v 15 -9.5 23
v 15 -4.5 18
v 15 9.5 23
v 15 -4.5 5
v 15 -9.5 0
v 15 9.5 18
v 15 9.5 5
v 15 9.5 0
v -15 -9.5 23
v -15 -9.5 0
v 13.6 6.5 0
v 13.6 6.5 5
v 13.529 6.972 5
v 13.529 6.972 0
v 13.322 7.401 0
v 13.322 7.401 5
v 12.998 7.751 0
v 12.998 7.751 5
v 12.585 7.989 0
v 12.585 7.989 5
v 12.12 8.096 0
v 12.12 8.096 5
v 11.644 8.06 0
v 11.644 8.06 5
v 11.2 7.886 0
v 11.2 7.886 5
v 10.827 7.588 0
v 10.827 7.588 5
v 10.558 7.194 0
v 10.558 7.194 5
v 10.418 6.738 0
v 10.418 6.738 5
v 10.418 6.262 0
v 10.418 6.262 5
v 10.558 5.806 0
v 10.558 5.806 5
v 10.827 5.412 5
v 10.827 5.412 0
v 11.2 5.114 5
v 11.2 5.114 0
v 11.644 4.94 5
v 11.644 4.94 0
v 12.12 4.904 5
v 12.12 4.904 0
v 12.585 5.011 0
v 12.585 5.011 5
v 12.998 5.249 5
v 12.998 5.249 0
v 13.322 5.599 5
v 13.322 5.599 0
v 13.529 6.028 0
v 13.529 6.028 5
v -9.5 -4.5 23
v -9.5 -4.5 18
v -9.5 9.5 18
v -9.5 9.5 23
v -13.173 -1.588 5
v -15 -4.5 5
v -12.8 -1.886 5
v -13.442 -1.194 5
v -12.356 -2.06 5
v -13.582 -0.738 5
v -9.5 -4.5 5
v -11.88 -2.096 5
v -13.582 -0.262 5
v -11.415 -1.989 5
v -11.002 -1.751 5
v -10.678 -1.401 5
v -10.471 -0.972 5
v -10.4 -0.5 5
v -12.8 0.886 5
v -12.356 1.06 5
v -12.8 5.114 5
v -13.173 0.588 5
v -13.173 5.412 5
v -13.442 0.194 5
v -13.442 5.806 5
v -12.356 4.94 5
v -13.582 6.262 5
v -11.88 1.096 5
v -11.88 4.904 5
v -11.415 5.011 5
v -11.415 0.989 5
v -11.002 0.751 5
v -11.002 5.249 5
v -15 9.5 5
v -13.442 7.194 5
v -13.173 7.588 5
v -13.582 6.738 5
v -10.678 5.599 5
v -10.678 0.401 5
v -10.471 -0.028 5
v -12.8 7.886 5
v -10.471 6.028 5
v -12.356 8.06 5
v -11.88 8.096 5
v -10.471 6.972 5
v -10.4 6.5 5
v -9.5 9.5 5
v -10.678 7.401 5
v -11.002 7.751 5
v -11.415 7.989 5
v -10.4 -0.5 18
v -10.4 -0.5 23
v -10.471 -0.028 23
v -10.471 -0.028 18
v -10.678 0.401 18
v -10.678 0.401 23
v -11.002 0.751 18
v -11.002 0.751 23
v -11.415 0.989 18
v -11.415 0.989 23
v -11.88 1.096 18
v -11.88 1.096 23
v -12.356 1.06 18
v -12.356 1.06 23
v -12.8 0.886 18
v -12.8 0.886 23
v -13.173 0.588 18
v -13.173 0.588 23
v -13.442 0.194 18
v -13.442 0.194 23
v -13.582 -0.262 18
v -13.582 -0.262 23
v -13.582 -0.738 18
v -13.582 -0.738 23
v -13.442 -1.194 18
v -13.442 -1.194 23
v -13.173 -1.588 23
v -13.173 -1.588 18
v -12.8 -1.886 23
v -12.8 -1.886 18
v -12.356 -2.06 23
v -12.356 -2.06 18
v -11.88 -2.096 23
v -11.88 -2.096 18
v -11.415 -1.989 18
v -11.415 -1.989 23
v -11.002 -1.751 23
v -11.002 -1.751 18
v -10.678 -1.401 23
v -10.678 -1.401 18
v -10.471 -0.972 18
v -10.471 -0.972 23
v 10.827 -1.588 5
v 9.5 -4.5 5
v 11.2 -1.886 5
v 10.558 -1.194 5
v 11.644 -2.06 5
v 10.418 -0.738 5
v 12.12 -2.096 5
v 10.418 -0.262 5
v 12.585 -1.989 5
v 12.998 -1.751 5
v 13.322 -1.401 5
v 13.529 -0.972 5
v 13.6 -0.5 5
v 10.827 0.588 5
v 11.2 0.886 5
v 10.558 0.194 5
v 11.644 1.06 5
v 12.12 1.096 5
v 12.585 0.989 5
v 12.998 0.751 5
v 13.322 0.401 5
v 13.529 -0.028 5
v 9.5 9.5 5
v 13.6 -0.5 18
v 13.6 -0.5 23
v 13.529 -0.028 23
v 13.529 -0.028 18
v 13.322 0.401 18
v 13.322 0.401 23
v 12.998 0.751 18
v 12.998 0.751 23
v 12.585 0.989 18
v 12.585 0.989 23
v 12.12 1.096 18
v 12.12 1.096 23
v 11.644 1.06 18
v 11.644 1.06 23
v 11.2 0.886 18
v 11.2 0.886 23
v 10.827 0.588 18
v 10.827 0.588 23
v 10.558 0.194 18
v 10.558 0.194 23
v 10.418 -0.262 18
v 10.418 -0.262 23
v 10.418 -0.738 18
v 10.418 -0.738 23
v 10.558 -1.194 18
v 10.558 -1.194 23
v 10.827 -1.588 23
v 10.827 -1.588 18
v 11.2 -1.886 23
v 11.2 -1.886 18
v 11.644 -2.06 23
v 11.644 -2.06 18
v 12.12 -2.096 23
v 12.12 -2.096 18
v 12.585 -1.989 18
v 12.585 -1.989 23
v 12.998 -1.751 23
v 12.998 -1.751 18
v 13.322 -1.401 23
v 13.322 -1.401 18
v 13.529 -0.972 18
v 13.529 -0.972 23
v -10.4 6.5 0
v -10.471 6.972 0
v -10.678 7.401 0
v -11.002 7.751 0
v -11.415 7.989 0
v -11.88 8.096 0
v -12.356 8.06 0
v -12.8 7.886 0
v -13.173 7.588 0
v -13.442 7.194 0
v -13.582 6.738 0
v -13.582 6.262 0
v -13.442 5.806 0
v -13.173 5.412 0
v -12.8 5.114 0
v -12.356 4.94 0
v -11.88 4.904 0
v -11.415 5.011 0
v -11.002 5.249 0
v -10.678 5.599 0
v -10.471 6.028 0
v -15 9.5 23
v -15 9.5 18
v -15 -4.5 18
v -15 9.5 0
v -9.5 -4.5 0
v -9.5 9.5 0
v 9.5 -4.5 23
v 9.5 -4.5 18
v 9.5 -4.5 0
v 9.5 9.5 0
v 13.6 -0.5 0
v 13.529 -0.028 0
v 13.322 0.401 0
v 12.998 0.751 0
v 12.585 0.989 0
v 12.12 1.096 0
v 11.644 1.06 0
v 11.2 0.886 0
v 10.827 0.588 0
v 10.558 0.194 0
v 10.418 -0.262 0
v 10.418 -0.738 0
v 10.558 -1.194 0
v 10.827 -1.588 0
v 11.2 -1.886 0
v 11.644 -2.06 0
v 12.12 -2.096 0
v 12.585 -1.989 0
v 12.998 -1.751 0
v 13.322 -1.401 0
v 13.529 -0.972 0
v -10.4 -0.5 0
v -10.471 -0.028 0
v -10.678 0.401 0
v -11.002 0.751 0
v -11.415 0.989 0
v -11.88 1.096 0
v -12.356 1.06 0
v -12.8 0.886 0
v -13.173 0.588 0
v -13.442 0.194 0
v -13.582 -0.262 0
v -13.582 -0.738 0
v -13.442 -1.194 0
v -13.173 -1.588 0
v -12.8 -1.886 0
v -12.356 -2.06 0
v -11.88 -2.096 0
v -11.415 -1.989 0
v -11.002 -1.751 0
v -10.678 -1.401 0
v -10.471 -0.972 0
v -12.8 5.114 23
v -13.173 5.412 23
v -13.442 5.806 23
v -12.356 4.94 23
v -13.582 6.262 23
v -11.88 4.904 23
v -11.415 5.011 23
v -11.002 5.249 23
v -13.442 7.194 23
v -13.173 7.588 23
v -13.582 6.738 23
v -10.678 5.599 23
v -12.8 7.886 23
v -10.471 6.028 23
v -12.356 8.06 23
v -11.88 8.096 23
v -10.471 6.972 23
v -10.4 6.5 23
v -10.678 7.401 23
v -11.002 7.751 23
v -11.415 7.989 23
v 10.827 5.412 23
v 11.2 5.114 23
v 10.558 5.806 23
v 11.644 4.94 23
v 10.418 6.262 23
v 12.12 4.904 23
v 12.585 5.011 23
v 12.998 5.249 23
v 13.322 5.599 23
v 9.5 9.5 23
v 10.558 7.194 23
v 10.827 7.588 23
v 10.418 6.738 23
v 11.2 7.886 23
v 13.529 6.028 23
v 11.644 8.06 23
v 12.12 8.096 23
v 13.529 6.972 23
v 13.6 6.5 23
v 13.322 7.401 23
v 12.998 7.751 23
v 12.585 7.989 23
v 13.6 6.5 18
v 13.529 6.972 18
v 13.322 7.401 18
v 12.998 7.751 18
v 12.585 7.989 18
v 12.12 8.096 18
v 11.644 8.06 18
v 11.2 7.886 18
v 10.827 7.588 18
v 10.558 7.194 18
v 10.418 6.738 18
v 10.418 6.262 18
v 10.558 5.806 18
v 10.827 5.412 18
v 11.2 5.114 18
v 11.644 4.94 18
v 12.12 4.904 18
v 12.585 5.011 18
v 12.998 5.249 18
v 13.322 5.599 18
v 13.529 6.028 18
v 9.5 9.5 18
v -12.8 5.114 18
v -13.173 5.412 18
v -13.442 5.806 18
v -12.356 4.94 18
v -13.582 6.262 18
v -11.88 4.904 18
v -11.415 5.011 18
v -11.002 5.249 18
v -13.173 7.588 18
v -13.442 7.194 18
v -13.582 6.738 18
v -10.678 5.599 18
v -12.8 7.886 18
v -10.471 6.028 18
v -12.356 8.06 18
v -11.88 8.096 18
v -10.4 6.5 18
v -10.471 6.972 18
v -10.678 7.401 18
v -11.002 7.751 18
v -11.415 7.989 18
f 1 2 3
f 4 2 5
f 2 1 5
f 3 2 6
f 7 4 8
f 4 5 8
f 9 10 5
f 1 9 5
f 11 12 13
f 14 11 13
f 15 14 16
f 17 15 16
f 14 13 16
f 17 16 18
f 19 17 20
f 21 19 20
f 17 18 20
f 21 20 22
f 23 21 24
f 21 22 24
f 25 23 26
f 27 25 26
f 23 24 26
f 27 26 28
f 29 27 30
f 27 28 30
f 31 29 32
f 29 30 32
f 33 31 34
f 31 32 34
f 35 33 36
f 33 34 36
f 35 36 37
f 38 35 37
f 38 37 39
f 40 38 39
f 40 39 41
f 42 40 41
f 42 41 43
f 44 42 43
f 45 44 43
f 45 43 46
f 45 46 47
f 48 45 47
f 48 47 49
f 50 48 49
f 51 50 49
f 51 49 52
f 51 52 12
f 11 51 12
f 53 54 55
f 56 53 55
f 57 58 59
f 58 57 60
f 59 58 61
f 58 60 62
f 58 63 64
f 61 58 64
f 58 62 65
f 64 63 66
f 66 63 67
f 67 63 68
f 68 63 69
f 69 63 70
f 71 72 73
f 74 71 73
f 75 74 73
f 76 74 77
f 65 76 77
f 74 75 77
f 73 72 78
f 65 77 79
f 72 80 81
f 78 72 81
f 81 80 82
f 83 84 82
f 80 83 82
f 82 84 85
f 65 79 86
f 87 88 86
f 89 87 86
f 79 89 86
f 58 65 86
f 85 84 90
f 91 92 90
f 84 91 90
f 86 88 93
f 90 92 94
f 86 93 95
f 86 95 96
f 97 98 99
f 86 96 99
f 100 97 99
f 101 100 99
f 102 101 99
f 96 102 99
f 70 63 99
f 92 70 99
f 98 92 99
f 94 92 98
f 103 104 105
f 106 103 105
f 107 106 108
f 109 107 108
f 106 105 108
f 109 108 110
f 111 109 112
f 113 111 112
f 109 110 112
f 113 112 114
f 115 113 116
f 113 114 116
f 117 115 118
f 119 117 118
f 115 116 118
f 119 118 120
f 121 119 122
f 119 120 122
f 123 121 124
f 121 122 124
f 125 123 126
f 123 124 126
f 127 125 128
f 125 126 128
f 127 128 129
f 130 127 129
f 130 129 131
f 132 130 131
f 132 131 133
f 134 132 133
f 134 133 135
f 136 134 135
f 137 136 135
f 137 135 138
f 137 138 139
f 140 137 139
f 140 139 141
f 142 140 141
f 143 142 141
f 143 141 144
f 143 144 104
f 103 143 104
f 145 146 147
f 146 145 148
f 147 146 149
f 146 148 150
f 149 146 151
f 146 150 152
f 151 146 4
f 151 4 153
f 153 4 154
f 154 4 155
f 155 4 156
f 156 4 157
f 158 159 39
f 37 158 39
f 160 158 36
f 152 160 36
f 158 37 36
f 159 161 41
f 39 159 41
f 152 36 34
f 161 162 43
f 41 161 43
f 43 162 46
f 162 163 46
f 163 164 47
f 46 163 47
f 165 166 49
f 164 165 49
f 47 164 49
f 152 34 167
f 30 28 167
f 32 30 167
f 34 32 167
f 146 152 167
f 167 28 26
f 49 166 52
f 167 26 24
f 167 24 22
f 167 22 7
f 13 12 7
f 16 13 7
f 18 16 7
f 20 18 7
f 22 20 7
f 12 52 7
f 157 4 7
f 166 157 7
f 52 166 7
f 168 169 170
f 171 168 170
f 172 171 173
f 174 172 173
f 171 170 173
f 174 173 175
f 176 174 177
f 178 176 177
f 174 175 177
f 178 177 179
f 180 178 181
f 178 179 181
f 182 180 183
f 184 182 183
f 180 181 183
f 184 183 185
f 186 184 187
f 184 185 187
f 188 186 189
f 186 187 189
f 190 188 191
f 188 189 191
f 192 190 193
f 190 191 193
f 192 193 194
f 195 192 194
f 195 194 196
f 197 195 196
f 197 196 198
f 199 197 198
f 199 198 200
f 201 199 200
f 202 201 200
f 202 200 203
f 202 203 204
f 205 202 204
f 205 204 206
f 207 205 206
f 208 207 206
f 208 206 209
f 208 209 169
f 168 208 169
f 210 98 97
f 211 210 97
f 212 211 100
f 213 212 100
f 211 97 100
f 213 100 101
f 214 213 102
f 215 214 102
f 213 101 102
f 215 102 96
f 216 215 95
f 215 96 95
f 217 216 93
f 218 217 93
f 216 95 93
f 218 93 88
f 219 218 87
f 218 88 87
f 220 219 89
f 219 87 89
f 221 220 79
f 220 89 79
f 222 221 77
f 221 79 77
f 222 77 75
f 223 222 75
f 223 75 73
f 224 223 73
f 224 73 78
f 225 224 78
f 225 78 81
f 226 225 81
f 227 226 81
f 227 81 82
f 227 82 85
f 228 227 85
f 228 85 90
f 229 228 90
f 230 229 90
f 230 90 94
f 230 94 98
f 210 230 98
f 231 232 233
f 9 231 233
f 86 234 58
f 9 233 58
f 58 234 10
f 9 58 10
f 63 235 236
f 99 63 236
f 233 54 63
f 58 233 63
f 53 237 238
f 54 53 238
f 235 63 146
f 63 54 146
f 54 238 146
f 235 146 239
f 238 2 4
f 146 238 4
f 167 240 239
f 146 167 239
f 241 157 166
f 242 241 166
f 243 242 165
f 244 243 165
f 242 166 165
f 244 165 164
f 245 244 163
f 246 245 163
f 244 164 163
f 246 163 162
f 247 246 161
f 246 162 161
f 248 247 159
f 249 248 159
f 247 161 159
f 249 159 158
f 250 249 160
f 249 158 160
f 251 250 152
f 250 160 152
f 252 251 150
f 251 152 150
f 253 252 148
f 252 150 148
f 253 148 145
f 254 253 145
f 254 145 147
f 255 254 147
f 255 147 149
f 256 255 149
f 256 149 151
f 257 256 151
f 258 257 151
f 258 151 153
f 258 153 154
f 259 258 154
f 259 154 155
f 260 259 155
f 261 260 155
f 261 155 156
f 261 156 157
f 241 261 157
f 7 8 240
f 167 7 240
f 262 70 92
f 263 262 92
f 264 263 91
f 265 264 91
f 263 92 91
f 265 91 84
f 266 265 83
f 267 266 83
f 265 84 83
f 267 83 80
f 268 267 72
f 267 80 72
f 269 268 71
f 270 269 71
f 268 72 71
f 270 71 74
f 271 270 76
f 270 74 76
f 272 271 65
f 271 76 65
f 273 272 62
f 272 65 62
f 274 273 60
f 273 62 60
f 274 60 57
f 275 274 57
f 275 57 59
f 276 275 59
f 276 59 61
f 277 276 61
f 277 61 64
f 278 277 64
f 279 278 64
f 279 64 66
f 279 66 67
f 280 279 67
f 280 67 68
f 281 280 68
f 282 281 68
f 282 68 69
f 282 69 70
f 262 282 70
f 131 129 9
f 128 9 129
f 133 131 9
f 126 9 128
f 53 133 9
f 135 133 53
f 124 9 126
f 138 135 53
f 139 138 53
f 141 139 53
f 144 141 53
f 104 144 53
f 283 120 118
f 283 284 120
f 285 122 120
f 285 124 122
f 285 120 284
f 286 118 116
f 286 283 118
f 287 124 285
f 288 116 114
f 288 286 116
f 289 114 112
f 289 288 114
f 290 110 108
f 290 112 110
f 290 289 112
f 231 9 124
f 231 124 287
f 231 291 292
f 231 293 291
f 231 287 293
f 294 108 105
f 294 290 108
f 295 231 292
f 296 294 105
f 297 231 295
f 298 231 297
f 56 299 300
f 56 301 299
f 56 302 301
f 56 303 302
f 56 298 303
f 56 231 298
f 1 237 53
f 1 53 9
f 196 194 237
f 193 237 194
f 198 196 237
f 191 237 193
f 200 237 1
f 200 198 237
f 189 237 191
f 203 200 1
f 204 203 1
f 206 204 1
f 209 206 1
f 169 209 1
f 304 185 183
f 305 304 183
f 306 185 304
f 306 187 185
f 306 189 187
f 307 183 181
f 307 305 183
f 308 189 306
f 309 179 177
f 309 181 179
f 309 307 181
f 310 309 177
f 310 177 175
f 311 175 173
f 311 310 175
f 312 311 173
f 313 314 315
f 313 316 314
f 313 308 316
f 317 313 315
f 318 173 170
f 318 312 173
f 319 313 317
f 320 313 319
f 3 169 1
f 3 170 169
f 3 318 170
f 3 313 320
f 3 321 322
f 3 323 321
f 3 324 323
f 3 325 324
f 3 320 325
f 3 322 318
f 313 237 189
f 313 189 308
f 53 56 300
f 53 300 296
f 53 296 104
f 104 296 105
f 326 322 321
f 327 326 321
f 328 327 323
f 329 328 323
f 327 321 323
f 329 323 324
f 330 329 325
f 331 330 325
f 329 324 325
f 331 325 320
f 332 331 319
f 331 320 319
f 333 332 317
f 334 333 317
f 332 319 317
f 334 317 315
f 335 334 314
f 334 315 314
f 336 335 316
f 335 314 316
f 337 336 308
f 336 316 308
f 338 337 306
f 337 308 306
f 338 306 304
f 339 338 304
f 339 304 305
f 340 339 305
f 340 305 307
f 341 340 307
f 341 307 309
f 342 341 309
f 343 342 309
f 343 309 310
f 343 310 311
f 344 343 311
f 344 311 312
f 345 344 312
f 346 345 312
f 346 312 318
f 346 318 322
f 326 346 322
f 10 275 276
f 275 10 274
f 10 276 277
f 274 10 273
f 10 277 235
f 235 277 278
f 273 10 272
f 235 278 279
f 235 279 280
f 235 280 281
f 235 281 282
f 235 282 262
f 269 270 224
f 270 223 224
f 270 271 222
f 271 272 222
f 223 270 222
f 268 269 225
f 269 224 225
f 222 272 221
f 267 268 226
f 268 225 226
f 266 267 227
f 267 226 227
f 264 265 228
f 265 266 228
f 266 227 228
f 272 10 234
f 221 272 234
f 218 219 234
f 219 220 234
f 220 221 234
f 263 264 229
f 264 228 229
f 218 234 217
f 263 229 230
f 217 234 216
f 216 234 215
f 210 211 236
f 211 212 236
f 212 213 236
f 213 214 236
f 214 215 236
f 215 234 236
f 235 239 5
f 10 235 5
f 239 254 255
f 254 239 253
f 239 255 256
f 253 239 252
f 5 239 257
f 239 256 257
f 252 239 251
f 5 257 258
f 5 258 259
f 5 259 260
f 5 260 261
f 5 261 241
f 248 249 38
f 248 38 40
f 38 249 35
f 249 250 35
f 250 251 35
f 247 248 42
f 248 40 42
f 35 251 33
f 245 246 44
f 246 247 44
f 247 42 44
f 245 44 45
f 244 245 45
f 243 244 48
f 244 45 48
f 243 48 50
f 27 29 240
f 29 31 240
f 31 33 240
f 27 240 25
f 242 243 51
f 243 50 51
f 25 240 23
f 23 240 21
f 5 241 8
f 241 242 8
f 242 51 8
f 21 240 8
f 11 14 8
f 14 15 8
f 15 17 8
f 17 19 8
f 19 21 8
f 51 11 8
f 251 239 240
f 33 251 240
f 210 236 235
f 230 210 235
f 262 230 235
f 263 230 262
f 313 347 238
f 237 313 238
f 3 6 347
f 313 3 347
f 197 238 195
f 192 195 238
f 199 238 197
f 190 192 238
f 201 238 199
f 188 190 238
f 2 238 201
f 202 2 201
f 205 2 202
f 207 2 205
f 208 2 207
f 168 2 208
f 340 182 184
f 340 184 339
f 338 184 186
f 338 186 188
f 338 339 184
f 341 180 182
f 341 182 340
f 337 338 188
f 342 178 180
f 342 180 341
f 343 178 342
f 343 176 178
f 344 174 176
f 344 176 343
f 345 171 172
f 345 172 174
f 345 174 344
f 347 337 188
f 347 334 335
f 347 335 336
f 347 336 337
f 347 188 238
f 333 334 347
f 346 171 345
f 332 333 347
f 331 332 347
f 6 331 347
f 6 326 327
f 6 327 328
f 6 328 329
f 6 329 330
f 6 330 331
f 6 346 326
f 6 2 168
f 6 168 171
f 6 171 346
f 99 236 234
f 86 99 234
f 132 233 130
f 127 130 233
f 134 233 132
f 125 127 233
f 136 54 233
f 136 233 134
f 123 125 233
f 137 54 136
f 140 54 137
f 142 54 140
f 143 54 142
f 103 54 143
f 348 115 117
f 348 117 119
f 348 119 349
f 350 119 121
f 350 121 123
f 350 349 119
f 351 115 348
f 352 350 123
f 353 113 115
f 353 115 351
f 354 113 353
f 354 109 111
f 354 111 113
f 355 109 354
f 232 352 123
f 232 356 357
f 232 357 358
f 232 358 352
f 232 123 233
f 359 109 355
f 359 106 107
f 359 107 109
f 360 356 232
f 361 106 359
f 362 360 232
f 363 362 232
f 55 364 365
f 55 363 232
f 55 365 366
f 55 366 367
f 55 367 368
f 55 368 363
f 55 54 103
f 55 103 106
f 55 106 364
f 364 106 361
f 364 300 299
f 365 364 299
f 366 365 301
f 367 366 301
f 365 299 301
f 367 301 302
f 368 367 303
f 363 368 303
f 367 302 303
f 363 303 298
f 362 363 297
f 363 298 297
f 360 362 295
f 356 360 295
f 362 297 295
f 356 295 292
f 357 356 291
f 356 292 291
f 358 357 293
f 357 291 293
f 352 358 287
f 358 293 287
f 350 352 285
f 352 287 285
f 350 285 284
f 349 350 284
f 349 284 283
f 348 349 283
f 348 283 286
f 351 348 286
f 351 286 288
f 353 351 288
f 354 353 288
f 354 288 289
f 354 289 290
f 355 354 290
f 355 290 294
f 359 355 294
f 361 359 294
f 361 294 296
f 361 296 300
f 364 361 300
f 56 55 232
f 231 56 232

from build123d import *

# Parameters (mm, degrees)
EXTRUDE_1_DEPTH     = 23
HOLE_WIZARD_1_D     = 3.2
SKETCH_4_W          = 13
SKETCH_4_H          = 14
CUT_EXTRUDE_1_DEPTH = 39.977557645


with BuildPart() as part:
    # 草图1 → 凸台-拉伸1 (new body)
    with BuildSketch(Plane.XY):
        Polygon((-15, -9.5), (15, -9.5), (15, 9.5), (9.5, 9.5), (9.5, -4.5), (-9.5, -4.5), (-9.5, 9.5), (-15, 9.5), align=None)
    extrude(amount=EXTRUDE_1_DEPTH)

    # 孔1 (through all)
    with Locations(Plane(origin=(0, 0, 0), x_dir=(-1, 0, 0), z_dir=(0, 0, -1))):
        with Locations((12, 6.5), (12, -0.5), (-12, -0.5), (-12, 6.5)):
            Hole(HOLE_WIZARD_1_D / 2)

    # 草图4 → 切除-拉伸1 (cut, through all)
    with BuildSketch(Plane(origin=(15, 0, 0), x_dir=(0, 0, -1), z_dir=(1, 0, 0))):
        with Locations((-11.5, 2.5)):
            Rectangle(SKETCH_4_W, SKETCH_4_H)
    extrude(amount=-CUT_EXTRUDE_1_DEPTH, mode=Mode.SUBTRACT)


solid = part.part
